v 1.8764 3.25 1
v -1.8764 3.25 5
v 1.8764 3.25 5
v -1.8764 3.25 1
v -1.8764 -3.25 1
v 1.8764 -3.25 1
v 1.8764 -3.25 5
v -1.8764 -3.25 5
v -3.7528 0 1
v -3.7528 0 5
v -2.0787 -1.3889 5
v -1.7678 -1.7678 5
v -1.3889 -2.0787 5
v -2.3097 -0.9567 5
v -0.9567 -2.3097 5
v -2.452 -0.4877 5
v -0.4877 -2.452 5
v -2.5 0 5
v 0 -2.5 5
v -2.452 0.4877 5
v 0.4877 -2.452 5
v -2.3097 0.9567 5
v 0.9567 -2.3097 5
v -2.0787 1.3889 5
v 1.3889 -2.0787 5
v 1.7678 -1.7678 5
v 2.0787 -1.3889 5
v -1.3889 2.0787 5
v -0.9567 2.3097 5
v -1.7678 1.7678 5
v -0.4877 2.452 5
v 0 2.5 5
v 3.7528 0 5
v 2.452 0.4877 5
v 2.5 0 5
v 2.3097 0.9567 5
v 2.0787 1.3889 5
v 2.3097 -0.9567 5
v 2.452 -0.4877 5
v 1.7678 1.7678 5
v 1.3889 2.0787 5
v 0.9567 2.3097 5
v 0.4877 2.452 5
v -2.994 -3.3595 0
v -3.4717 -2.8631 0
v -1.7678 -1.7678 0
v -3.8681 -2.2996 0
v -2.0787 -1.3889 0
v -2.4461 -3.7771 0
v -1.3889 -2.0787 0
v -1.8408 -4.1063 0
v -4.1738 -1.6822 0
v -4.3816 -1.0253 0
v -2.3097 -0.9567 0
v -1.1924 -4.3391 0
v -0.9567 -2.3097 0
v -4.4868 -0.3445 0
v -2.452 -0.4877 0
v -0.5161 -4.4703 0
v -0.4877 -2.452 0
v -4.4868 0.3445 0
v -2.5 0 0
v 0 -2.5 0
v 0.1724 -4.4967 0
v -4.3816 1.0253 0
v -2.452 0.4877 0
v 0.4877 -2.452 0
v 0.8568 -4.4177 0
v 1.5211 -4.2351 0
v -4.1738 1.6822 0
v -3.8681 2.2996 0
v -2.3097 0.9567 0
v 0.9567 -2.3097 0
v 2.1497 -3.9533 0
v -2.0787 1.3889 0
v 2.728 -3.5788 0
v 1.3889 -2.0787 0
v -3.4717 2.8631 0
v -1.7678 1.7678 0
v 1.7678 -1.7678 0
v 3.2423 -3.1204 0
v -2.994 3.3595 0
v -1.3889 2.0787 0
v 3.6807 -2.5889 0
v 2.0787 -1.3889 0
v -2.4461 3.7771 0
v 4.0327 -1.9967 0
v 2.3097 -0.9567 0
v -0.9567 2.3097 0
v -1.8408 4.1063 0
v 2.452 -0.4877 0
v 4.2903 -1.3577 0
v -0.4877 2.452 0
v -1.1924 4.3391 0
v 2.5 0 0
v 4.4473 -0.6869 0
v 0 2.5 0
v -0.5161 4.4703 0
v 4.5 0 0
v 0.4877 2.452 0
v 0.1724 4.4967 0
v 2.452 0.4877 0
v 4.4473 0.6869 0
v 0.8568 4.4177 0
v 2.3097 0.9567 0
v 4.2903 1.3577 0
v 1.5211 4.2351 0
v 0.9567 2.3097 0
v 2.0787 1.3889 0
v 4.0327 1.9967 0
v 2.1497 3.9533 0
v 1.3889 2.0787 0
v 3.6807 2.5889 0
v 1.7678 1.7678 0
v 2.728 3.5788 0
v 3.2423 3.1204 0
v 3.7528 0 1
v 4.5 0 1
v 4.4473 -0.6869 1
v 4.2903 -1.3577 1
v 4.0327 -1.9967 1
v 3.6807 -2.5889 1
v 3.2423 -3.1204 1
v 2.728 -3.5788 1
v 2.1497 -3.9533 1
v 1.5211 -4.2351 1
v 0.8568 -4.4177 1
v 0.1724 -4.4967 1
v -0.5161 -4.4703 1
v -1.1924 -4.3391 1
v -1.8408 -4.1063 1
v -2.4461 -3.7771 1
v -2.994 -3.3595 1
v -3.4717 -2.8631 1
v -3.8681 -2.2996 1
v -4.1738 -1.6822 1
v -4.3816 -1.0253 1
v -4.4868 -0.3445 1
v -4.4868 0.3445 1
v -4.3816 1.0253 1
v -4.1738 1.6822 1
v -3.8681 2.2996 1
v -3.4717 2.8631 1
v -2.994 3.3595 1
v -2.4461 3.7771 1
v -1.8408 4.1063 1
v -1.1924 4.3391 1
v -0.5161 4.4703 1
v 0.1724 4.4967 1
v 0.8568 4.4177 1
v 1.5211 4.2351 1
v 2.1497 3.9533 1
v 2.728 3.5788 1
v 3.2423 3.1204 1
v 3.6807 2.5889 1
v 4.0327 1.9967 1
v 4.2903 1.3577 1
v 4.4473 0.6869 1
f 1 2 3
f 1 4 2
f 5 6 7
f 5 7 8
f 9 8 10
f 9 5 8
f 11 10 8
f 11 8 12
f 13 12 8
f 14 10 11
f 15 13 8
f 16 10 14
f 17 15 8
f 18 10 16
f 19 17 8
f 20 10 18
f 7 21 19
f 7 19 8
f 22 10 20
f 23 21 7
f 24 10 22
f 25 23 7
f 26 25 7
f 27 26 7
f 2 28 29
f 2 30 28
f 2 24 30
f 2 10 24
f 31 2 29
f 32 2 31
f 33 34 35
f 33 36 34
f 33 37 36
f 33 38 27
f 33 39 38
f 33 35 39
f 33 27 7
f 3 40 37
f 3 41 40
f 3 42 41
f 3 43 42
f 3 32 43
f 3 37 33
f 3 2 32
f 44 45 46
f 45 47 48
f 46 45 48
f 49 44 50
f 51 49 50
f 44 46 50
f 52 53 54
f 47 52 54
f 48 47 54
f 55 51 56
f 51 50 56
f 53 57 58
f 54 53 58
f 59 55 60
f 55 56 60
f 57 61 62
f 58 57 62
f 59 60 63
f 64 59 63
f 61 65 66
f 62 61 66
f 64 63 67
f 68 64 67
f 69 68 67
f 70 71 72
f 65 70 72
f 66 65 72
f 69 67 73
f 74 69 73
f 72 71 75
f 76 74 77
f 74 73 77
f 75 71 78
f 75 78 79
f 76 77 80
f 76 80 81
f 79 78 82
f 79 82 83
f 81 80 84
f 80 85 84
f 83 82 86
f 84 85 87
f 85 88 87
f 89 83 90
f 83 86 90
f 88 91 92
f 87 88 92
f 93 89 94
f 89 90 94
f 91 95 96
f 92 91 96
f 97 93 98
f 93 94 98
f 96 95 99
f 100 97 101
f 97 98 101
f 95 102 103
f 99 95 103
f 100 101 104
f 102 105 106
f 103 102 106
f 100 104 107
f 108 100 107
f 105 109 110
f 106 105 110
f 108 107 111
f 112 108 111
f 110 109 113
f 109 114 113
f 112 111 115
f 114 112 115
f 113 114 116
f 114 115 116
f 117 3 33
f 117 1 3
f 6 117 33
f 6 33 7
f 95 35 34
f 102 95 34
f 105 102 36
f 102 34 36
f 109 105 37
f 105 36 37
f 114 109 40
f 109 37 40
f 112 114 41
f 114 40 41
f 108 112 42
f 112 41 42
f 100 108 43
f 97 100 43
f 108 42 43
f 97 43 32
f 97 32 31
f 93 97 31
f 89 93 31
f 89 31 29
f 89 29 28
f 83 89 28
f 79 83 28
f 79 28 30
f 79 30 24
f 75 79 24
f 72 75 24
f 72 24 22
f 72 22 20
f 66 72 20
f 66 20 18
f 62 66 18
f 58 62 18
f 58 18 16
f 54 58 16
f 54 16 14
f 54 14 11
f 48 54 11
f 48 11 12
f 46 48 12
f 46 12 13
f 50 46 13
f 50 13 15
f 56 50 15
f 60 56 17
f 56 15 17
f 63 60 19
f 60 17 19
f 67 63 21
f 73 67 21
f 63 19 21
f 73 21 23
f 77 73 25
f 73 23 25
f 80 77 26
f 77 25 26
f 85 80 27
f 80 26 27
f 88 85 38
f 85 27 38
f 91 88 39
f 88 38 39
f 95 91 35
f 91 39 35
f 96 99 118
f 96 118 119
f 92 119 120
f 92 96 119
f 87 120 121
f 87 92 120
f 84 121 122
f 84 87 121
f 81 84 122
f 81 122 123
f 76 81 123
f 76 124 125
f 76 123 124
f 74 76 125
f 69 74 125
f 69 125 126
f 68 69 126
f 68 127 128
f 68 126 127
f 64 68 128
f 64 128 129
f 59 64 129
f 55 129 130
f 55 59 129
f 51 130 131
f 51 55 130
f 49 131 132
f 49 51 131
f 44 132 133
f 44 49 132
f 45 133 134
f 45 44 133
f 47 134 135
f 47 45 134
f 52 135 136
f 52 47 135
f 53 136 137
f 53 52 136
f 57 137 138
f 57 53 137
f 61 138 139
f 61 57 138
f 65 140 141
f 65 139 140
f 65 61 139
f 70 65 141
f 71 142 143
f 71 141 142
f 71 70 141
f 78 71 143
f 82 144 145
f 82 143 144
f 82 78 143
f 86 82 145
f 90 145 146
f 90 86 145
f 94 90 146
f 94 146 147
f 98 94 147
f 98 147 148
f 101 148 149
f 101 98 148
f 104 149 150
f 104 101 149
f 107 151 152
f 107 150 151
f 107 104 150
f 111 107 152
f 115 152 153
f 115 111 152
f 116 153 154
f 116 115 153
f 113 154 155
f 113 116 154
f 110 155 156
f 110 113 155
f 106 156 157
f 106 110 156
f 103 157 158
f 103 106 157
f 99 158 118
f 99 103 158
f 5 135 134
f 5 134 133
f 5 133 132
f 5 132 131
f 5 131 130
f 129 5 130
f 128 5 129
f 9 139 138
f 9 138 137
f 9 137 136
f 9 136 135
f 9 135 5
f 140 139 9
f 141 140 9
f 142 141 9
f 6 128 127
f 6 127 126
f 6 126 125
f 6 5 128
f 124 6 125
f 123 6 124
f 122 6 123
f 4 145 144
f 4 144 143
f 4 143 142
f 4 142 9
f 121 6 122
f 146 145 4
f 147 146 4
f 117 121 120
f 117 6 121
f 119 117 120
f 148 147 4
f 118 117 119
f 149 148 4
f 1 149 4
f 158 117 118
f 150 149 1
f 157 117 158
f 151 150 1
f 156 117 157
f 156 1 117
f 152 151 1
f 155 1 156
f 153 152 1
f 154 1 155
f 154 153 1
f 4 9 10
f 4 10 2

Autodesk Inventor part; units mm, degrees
ref_plane "YZ Plane" through (0, 0, 0) normal (1, 0, 0) x (0, 1, 0)
ref_plane "XZ Plane" through (0, 0, 0) normal (0, 1, 0) x (-1, 0, 0)
ref_plane "XY Plane" through (0, 0, 0) normal (0, 0, 1) x (1, 0, 0)
sketch "草图1" plane through (0, 0, 0) normal (0, 0, 1) x (1, 0, 0)
  circle A0 centre (0, 0) radius 4.5
  dimension "d0" = 9
extrude "拉伸1" add sketch "草图1" along normal blind 1
sketch "草图2" plane through (0, 0, 1) normal (0, 0, 1) x (1, 0, 0)
  line L0 (1.8764, -3.25) -> (-1.8764, -3.25)
  line L1 (-1.8764, -3.25) -> (-3.7528, 0)
  line L2 (-3.7528, 0) -> (-1.8764, 3.25)
  line L3 (-1.8764, 3.25) -> (1.8764, 3.25)
  line L4 (1.8764, 3.25) -> (3.7528, 0)
  line L5 (3.7528, 0) -> (1.8764, -3.25)
  line L6 (0, 0) -> (0, 3.25)
  dimension "d3" = 6.5
extrude "拉伸2" add sketch "草图2" along normal blind 4
sketch "草图3" plane through (0, 0, 5) normal (0, 0, 1) x (1, 0, 0)
  circle A0 centre (0, 0) radius 2.5
  dimension "d6" = 5
extrude "拉伸3" cut sketch "草图3" against normal through all
thread "螺纹1" size "M5x0.8" class "6H" standard "ANSI Metric M Profile" full length
properties part number "刮肉轮固定螺丝"
